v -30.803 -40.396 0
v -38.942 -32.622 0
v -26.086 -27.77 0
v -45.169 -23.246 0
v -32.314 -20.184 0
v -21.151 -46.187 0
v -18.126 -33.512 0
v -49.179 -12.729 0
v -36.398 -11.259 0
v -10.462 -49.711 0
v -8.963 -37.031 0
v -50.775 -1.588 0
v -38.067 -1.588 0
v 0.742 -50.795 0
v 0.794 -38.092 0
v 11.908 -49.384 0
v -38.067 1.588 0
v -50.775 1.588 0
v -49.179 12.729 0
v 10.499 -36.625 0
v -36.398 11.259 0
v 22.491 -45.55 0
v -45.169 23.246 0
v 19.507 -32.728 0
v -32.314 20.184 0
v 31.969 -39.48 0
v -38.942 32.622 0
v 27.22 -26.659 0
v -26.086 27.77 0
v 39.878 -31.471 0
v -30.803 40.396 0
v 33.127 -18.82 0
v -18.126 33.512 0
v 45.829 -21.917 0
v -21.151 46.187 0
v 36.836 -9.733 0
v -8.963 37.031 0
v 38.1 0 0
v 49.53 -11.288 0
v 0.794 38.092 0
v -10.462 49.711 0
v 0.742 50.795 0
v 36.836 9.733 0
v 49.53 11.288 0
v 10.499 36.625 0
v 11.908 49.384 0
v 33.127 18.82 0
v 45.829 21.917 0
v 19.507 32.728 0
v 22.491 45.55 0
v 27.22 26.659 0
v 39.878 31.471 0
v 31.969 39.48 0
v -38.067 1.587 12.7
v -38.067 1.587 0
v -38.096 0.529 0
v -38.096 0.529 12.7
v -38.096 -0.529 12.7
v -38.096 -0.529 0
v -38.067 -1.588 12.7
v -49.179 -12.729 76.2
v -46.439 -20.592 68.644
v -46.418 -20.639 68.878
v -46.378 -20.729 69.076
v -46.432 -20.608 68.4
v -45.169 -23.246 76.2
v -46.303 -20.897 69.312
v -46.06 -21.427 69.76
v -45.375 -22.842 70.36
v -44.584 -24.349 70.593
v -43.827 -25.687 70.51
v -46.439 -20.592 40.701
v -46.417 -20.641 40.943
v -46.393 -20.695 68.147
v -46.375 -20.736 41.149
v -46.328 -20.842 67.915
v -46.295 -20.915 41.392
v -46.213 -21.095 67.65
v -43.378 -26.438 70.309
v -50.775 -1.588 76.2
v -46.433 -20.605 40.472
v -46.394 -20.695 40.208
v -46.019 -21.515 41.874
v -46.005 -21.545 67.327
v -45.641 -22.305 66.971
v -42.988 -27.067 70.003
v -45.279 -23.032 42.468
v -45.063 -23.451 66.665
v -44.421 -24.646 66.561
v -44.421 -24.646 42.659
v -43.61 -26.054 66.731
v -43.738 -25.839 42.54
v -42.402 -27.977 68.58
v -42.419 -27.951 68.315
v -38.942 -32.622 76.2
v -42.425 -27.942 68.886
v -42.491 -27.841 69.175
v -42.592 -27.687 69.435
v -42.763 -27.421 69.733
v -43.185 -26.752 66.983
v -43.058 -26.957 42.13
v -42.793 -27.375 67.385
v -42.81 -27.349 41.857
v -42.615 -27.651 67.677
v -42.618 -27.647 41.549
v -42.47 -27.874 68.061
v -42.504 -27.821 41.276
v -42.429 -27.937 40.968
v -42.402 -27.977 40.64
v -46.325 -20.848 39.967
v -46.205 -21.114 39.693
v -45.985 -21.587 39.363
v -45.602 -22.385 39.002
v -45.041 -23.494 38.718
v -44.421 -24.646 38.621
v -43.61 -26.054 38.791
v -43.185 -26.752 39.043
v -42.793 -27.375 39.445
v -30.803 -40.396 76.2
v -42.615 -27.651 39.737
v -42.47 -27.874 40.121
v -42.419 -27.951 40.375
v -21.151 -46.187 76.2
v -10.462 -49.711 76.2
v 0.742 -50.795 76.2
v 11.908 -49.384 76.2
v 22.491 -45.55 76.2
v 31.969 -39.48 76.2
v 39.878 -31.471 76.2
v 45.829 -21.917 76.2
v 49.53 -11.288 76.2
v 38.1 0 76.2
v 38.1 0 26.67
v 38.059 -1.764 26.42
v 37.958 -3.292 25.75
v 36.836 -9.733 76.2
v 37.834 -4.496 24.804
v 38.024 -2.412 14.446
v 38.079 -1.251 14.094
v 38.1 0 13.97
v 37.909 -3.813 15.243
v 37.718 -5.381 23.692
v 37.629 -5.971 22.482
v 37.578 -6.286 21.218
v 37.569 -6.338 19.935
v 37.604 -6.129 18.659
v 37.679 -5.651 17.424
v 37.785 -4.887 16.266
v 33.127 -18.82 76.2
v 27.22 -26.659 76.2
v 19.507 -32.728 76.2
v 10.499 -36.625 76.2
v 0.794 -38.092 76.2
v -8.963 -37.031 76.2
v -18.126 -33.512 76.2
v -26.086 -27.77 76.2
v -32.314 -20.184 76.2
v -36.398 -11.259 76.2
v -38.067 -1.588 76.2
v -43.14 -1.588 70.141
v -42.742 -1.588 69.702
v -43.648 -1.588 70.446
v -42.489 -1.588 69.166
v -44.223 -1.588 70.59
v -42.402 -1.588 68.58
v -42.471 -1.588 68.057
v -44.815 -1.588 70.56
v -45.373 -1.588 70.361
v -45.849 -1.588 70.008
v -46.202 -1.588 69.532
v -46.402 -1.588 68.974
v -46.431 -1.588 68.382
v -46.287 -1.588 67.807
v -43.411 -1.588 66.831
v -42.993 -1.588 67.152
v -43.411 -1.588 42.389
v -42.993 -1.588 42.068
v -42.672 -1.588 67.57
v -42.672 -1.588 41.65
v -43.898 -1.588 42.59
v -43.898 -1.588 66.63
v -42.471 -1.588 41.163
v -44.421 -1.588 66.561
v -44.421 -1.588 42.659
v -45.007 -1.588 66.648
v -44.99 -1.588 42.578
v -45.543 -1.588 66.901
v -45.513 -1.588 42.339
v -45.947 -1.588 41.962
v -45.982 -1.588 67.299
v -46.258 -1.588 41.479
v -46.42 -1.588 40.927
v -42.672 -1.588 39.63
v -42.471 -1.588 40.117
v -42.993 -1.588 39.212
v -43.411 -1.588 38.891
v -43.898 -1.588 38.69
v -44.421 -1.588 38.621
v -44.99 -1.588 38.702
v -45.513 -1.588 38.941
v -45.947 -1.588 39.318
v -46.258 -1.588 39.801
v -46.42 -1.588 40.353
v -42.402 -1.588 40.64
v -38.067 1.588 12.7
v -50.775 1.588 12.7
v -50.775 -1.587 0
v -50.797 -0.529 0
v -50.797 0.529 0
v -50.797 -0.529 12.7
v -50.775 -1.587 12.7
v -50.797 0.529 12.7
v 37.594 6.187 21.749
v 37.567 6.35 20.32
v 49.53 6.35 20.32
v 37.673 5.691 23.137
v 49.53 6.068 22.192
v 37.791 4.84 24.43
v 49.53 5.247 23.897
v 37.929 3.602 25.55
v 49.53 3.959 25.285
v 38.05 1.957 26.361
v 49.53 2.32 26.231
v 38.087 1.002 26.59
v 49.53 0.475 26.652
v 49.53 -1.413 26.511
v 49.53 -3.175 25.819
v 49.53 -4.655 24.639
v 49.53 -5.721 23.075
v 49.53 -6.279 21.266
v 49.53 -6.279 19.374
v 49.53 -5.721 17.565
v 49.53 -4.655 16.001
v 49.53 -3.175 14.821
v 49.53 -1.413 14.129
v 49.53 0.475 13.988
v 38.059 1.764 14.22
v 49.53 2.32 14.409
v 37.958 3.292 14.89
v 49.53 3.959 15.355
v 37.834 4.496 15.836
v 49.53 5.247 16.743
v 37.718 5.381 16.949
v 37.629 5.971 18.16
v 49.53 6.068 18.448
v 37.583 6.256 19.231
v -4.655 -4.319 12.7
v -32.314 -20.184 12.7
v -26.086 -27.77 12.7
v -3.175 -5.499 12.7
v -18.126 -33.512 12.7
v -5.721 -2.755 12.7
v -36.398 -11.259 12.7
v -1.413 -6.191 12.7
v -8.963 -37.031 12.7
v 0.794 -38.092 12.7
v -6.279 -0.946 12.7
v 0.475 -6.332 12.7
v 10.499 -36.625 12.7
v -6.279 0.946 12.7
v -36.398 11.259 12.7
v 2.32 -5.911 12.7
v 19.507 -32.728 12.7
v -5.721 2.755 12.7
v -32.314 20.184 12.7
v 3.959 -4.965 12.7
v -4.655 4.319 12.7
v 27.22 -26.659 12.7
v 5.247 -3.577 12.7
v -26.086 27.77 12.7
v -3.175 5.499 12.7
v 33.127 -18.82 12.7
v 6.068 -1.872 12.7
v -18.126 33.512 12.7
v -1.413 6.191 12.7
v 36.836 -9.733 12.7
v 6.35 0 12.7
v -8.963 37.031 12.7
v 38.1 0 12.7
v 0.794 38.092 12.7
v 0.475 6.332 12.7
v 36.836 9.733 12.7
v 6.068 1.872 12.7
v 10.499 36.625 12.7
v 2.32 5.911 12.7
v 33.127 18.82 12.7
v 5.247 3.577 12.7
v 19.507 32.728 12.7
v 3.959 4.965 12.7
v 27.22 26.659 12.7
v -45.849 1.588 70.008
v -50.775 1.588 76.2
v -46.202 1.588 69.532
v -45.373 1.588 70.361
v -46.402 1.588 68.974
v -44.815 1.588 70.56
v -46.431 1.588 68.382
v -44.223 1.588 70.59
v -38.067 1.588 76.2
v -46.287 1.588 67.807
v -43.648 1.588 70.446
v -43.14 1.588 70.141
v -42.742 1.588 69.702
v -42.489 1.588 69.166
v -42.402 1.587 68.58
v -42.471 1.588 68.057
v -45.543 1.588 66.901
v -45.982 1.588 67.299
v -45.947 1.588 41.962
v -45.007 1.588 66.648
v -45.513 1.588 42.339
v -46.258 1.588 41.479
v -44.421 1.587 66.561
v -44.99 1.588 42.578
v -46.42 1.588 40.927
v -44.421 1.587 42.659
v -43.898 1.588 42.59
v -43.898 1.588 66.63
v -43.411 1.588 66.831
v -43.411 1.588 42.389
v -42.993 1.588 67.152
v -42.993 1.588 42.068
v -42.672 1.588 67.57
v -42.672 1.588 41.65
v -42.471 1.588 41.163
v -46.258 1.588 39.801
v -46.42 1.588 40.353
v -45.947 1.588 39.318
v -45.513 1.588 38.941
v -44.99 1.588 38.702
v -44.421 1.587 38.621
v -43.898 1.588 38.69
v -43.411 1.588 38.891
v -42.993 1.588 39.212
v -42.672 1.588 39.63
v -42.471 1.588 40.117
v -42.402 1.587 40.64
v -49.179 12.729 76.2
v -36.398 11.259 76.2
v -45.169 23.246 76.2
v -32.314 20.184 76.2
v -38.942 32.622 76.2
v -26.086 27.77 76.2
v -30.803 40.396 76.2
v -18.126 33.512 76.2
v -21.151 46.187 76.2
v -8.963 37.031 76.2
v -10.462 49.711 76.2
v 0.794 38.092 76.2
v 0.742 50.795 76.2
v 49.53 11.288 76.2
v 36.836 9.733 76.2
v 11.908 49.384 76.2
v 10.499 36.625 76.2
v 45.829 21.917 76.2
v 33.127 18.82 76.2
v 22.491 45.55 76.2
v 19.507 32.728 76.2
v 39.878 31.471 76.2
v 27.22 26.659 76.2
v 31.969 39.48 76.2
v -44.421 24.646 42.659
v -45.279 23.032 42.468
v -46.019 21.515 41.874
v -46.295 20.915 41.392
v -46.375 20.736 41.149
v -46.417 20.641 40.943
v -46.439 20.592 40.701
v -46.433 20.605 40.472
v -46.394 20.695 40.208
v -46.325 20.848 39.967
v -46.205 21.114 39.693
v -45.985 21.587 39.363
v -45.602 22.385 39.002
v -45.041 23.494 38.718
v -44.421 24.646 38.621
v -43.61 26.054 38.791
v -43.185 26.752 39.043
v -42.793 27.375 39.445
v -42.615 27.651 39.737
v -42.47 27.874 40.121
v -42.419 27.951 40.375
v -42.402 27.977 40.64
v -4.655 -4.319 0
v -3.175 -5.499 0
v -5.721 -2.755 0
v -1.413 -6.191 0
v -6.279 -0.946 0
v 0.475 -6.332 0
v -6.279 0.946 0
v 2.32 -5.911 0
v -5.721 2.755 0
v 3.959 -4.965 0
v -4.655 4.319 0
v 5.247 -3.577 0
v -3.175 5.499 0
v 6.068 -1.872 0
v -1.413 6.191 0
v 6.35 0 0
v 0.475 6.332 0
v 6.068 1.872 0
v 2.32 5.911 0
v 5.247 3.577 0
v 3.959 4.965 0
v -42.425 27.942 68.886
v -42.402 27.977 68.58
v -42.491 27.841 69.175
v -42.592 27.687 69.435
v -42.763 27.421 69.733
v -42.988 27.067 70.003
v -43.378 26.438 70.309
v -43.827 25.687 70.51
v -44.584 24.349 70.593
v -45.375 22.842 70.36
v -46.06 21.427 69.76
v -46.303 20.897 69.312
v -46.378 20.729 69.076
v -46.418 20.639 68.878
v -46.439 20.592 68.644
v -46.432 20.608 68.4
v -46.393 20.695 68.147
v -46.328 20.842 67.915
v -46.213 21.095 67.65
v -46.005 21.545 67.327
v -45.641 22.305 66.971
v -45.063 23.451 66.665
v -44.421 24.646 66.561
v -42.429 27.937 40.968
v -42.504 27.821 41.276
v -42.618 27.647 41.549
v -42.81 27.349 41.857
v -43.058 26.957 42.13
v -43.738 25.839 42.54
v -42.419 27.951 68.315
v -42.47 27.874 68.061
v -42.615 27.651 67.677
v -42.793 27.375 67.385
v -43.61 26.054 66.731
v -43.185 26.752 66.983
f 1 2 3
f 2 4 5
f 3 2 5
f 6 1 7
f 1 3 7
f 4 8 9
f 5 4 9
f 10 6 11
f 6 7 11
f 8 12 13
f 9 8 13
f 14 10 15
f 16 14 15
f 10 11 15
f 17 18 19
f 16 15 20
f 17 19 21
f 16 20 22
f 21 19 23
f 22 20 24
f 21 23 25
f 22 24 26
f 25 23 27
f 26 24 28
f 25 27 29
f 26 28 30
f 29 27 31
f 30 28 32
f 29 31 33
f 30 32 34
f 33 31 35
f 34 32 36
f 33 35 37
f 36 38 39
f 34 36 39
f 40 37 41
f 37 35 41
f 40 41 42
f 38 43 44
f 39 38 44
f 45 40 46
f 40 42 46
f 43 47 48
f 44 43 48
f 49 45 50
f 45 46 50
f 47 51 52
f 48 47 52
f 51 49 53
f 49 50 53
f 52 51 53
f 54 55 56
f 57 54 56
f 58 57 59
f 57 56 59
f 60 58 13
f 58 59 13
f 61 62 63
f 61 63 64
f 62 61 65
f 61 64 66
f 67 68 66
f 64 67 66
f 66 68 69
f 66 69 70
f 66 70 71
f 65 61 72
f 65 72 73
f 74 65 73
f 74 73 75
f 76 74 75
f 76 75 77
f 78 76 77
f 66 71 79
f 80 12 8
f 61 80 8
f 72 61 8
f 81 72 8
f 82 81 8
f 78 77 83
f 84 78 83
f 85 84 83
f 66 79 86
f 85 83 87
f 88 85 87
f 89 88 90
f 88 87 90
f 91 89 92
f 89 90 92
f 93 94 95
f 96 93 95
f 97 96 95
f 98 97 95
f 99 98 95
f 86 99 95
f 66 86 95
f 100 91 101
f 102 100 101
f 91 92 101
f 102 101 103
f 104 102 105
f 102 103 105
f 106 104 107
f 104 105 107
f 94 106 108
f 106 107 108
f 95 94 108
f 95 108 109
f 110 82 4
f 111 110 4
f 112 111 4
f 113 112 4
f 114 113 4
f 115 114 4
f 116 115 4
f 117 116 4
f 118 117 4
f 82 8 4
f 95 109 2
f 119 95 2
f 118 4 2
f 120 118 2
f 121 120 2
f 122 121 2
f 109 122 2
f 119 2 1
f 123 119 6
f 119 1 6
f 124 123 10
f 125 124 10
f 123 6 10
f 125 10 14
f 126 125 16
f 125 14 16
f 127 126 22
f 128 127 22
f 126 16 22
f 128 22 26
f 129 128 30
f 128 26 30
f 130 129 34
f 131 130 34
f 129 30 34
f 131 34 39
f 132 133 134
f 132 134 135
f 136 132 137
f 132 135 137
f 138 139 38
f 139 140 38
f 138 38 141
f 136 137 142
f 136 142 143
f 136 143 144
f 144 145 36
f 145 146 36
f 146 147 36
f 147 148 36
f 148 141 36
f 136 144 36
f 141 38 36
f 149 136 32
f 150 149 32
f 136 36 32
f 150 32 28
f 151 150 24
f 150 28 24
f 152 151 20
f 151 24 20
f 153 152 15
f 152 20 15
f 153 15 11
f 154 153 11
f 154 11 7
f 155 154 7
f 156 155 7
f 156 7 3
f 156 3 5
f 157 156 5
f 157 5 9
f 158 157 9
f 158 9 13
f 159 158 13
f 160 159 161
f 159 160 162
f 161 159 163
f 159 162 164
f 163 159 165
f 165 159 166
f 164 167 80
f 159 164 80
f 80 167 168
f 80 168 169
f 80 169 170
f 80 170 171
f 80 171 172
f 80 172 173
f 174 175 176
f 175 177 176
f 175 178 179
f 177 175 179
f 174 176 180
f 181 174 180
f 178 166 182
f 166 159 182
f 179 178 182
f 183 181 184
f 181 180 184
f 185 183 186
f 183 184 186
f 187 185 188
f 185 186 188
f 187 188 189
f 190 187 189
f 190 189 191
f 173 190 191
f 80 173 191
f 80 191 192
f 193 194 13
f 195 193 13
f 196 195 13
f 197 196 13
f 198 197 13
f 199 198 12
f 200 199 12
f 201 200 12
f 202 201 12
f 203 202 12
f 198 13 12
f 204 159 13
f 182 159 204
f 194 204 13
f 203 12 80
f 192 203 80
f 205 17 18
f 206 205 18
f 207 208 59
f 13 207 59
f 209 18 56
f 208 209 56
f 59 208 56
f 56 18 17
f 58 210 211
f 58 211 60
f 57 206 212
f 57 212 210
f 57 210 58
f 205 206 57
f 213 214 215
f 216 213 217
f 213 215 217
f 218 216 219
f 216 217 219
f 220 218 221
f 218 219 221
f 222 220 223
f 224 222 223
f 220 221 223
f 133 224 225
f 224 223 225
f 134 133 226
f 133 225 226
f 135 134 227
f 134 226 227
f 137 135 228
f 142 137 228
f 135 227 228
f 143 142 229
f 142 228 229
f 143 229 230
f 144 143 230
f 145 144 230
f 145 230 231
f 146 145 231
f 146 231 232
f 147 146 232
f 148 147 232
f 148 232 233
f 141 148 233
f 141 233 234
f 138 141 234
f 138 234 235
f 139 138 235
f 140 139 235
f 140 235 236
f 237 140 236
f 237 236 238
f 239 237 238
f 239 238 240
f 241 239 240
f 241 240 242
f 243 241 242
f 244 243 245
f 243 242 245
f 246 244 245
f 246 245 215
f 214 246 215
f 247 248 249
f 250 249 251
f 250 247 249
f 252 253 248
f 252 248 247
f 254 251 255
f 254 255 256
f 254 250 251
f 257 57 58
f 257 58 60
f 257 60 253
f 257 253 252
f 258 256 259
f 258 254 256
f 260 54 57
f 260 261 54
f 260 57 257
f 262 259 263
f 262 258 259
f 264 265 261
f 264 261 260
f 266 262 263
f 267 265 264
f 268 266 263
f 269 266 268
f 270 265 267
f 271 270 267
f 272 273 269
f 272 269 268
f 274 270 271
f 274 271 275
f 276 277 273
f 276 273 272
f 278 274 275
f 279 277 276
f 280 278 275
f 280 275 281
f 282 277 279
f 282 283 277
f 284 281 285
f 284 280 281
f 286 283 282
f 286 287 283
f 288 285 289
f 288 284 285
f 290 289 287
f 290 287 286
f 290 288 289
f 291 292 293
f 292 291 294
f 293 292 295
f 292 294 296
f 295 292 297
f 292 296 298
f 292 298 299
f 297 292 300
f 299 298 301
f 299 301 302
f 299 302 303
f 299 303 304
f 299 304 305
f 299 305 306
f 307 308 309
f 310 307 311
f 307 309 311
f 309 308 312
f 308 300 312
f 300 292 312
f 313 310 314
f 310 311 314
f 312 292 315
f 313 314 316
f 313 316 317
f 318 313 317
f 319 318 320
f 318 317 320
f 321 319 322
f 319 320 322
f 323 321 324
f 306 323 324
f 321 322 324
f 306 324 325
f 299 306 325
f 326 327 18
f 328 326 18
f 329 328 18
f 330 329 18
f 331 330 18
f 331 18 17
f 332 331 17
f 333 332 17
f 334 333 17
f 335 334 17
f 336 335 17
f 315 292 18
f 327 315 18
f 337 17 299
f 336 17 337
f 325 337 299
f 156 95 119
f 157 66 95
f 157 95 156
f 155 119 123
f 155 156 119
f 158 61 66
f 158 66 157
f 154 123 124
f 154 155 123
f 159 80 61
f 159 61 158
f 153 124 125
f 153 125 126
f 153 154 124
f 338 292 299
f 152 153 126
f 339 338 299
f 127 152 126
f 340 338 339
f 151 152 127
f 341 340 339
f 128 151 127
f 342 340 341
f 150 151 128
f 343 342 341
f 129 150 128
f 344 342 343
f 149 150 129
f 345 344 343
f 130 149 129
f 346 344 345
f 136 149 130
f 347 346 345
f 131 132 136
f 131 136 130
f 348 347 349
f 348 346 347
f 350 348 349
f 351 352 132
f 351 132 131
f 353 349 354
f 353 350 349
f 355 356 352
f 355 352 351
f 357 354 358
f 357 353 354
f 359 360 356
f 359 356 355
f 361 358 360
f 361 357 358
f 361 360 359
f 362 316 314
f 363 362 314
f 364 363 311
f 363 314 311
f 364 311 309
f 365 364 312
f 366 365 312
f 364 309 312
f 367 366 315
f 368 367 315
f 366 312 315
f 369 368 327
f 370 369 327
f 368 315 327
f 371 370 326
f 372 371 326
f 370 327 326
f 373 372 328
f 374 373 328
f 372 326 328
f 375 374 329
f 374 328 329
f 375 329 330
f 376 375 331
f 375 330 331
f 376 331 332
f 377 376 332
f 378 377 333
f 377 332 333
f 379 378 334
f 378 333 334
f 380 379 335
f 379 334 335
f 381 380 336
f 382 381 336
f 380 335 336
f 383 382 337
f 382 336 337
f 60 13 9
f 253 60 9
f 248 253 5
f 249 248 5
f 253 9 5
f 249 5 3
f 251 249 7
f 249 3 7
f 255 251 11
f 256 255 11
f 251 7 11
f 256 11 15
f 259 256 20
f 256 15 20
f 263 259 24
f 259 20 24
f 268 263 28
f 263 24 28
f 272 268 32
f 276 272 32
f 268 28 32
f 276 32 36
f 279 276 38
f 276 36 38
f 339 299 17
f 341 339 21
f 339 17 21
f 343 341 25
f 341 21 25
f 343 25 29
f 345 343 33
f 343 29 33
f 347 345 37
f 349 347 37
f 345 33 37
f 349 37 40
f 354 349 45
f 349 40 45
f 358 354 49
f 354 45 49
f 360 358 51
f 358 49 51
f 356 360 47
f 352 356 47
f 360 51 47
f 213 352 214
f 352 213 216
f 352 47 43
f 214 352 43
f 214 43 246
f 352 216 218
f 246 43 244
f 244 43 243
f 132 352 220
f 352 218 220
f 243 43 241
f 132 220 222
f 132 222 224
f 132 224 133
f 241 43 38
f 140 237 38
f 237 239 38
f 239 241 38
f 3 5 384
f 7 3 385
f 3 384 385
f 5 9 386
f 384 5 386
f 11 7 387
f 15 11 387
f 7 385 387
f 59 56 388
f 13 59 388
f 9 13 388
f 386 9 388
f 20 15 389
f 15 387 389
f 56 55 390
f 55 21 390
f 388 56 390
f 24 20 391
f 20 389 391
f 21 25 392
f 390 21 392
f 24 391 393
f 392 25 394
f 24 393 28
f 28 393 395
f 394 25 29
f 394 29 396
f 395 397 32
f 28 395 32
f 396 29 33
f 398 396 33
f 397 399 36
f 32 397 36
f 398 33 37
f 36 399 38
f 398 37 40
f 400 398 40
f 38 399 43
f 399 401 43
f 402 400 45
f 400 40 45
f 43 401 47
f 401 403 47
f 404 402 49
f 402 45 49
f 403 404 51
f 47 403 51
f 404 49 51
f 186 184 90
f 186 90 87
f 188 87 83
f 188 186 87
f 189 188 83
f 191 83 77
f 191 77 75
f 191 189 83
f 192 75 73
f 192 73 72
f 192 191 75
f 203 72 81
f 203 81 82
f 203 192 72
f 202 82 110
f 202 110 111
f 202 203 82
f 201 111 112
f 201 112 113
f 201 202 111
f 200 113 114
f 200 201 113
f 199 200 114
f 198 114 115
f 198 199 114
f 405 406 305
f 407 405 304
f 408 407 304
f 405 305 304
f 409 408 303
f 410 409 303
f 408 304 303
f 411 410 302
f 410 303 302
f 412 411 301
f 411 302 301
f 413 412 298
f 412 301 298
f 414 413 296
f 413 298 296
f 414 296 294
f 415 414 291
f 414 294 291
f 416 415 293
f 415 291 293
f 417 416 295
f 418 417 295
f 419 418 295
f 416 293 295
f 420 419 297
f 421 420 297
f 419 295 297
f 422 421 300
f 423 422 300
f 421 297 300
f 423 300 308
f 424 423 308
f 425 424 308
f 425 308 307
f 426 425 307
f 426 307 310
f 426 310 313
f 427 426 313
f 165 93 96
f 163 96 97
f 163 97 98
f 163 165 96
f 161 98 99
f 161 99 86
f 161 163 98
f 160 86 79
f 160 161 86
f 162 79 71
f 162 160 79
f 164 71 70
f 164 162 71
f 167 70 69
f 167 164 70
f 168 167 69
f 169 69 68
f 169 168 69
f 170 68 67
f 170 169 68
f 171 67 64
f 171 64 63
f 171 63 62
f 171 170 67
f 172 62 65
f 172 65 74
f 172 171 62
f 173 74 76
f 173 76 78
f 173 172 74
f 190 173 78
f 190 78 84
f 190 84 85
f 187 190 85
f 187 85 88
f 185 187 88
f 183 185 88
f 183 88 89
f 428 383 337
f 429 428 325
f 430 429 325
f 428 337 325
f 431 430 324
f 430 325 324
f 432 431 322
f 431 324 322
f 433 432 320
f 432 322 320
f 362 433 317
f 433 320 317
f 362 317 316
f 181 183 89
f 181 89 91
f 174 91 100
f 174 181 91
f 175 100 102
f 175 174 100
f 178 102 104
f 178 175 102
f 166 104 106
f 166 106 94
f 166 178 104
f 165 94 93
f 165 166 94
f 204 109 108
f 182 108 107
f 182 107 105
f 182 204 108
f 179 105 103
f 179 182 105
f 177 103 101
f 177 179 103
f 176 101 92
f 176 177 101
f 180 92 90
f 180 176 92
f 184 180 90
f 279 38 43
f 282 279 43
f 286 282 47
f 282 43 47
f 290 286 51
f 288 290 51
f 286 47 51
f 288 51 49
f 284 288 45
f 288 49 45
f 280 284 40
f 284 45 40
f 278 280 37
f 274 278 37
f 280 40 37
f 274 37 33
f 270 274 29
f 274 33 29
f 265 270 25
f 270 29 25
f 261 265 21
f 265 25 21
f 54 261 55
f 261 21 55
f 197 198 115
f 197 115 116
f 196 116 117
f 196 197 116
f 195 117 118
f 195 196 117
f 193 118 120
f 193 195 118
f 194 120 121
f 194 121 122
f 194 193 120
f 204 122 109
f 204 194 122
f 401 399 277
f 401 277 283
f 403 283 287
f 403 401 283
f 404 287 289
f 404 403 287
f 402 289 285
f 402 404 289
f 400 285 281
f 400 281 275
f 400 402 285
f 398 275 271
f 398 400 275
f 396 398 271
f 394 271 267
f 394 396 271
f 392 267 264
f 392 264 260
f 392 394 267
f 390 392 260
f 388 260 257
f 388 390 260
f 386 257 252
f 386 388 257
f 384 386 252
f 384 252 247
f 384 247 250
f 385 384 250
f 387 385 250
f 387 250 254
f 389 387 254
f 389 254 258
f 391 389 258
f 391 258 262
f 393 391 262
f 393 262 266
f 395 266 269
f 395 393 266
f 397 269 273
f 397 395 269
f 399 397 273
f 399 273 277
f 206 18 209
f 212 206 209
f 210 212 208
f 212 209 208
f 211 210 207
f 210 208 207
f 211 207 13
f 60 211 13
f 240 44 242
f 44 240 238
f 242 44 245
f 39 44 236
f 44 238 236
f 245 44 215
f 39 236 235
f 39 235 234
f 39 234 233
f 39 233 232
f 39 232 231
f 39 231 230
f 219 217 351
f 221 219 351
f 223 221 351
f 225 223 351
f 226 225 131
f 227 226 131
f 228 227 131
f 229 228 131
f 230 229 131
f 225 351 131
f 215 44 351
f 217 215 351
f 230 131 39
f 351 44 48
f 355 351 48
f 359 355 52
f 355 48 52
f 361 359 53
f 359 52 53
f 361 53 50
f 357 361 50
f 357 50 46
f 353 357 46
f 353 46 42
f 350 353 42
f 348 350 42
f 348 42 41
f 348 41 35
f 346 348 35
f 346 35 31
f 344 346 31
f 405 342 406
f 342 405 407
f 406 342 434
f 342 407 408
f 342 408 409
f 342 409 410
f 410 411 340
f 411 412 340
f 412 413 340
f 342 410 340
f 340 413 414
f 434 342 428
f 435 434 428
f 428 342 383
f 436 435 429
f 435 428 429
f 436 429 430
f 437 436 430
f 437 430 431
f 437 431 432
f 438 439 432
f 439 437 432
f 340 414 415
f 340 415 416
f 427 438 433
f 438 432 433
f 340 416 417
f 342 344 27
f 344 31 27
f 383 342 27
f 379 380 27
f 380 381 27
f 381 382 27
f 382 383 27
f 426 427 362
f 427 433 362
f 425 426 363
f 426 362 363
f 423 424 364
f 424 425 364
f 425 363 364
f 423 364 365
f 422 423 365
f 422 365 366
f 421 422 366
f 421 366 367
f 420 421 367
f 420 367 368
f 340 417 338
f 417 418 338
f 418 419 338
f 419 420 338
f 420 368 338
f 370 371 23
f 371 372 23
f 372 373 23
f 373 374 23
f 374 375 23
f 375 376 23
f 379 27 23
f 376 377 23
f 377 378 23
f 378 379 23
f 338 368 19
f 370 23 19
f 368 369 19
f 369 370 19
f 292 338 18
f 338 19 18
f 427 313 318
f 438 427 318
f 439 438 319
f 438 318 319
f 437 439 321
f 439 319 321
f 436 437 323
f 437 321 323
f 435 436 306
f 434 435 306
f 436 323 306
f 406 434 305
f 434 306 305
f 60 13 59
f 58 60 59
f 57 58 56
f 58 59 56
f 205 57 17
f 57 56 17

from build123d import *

# Parameters (mm, degrees)
F1_R          = 6.35
F2_DEPTH      = 12.7
F3_DEPTH      = 76.2
F5_DEPTH      = 31.75
F5_DEPTH_BACK = 31.75
F7_DEPTH      = 76.2
F8_R          = 6.35
F9_DEPTH      = 12.7


with BuildPart() as f2:
    # F1 (on face) → F2 (new body)
    with BuildSketch(Plane.XY):
        with BuildLine():
            ThreePointArc((-38.0669127163, 1.5875), (-38.1, 0), (-38.0669127163, -1.5875))
            ThreePointArc((-38.0669127163, -1.5875), (0.7939223857, -38.0917272809), (38.1, 0))
            ThreePointArc((38.1, 0), (0.7939223857, 38.0917272809), (-38.0669127163, 1.5875))
        make_face()
        Circle(F1_R, mode=Mode.SUBTRACT)
    extrude(amount=F2_DEPTH)


with BuildPart() as f2b:
    # F0 (on Top) → F2, piece 2 (new body)
    with BuildSketch(Plane.XY):
        with BuildLine():
            ThreePointArc((-38.0669127163, -1.5875), (-38.1, 0), (-38.0669127163, 1.5875))
            Line((-38.0669127163, 1.5875), (-50.7751892537, 1.5875))
            ThreePointArc((-50.7751892537, 1.5875), (-50.8, 0), (-50.7751892537, -1.5875))
            Line((-50.7751892537, -1.5875), (-38.0669127163, -1.5875))
        make_face()
    extrude(amount=F2_DEPTH)


with BuildPart() as f3:
    # F0 (on Top) → F3 (new body)
    with BuildSketch(Plane.XY):
        with BuildLine():
            ThreePointArc((-38.0669127163, 1.5875), (0.7939223857, 38.0917272809), (38.1, 0))
            ThreePointArc((38.1, 0), (0.7939223857, -38.0917272809), (-38.0669127163, -1.5875))
            Line((-38.0669127163, -1.5875), (-50.7751892537, -1.5875))
            ThreePointArc((-50.7751892537, -1.5875), (0.7938469347, -50.7937969347), (50.8, 0))
            ThreePointArc((50.8, 0), (0.7938469347, 50.7937969347), (-50.7751892537, 1.5875))
            Line((-50.7751892537, 1.5875), (-38.0669127163, 1.5875))
        make_face()
    extrude(amount=F3_DEPTH)

    # F4 (on face) → F5 (cut, two sides)
    with BuildSketch(Plane.XZ.offset(-1.5875)) as f5_sk:
        with BuildLine():
            ThreePointArc((-42.401750985, 68.58), (-42.9931902618, 70.0078607233), (-44.421050985, 70.5993))
            Line((-44.421050985, 70.5993), (-44.421050985, 68.58))
            Line((-44.421050985, 68.58), (-42.401750985, 68.58))
        make_face()
        with BuildLine():
            Line((-44.421050985, 68.58), (-44.421050985, 70.5993))
            ThreePointArc((-44.421050985, 70.5993), (-45.8489117083, 70.0078607232), (-46.440350985, 68.58))
            Line((-46.440350985, 68.58), (-44.421050985, 68.58))
        make_face()
        with BuildLine():
            Line((-44.421050985, 66.5607), (-44.421050985, 68.58))
            Line((-44.421050985, 68.58), (-46.440350985, 68.58))
            ThreePointArc((-46.440350985, 68.58), (-45.8489117083, 67.1521392768), (-44.421050985, 66.5607))
        make_face()
        with BuildLine():
            Line((-42.401750985, 68.58), (-44.421050985, 68.58))
            Line((-44.421050985, 68.58), (-44.421050985, 66.5607))
            ThreePointArc((-44.421050985, 66.5607), (-42.9931902618, 67.1521392768), (-42.401750985, 68.58))
        make_face()
        with BuildLine():
            Line((-44.421050985, 40.64), (-44.421050985, 42.6593))
            ThreePointArc((-44.421050985, 42.6593), (-45.8489117083, 42.0678607232), (-46.440350985, 40.64))
            Line((-46.440350985, 40.64), (-44.421050985, 40.64))
        make_face()
        with BuildLine():
            ThreePointArc((-42.401750985, 40.64), (-42.9931902618, 42.0678607232), (-44.421050985, 42.6593))
            Line((-44.421050985, 42.6593), (-44.421050985, 40.64))
            Line((-44.421050985, 40.64), (-42.401750985, 40.64))
        make_face()
        with BuildLine():
            ThreePointArc((-44.421050985, 38.6207), (-42.9931902618, 39.2121392768), (-42.401750985, 40.64))
            Line((-42.401750985, 40.64), (-44.421050985, 40.64))
            Line((-44.421050985, 40.64), (-44.421050985, 38.6207))
        make_face()
        with BuildLine():
            Line((-44.421050985, 40.64), (-46.440350985, 40.64))
            ThreePointArc((-46.440350985, 40.64), (-45.8489117083, 39.2121392768), (-44.421050985, 38.6207))
            Line((-44.421050985, 38.6207), (-44.421050985, 40.64))
        make_face()
    extrude(amount=-F5_DEPTH, mode=Mode.SUBTRACT)
    extrude(f5_sk.sketch, amount=F5_DEPTH_BACK, mode=Mode.SUBTRACT)

    # F6 (on face) → F7 (cut)
    with BuildSketch(Plane.XY.offset(76.2)):
        with BuildLine():
            ThreePointArc((49.53, -11.28800691), (50.4815015625, -5.6796126628), (50.8, 0))
            Line((50.8, 0), (49.53, 0))
            Line((49.53, 0), (49.53, -11.28800691))
        make_face()
        with BuildLine():
            Line((49.53, 0), (50.8, 0))
            ThreePointArc((50.8, 0), (50.4815015625, 5.6796126628), (49.53, 11.28800691))
            Line((49.53, 11.28800691), (49.53, 0))
        make_face()
    extrude(amount=-F7_DEPTH, mode=Mode.SUBTRACT)

    # F8 (on face) → F9 (cut)
    with BuildSketch(Plane.YZ.offset(49.53)):
        with Locations((0, 20.32)):
            Circle(F8_R)
    extrude(amount=-F9_DEPTH, mode=Mode.SUBTRACT)


solid = Compound([f2.part, f2b.part, f3.part])
